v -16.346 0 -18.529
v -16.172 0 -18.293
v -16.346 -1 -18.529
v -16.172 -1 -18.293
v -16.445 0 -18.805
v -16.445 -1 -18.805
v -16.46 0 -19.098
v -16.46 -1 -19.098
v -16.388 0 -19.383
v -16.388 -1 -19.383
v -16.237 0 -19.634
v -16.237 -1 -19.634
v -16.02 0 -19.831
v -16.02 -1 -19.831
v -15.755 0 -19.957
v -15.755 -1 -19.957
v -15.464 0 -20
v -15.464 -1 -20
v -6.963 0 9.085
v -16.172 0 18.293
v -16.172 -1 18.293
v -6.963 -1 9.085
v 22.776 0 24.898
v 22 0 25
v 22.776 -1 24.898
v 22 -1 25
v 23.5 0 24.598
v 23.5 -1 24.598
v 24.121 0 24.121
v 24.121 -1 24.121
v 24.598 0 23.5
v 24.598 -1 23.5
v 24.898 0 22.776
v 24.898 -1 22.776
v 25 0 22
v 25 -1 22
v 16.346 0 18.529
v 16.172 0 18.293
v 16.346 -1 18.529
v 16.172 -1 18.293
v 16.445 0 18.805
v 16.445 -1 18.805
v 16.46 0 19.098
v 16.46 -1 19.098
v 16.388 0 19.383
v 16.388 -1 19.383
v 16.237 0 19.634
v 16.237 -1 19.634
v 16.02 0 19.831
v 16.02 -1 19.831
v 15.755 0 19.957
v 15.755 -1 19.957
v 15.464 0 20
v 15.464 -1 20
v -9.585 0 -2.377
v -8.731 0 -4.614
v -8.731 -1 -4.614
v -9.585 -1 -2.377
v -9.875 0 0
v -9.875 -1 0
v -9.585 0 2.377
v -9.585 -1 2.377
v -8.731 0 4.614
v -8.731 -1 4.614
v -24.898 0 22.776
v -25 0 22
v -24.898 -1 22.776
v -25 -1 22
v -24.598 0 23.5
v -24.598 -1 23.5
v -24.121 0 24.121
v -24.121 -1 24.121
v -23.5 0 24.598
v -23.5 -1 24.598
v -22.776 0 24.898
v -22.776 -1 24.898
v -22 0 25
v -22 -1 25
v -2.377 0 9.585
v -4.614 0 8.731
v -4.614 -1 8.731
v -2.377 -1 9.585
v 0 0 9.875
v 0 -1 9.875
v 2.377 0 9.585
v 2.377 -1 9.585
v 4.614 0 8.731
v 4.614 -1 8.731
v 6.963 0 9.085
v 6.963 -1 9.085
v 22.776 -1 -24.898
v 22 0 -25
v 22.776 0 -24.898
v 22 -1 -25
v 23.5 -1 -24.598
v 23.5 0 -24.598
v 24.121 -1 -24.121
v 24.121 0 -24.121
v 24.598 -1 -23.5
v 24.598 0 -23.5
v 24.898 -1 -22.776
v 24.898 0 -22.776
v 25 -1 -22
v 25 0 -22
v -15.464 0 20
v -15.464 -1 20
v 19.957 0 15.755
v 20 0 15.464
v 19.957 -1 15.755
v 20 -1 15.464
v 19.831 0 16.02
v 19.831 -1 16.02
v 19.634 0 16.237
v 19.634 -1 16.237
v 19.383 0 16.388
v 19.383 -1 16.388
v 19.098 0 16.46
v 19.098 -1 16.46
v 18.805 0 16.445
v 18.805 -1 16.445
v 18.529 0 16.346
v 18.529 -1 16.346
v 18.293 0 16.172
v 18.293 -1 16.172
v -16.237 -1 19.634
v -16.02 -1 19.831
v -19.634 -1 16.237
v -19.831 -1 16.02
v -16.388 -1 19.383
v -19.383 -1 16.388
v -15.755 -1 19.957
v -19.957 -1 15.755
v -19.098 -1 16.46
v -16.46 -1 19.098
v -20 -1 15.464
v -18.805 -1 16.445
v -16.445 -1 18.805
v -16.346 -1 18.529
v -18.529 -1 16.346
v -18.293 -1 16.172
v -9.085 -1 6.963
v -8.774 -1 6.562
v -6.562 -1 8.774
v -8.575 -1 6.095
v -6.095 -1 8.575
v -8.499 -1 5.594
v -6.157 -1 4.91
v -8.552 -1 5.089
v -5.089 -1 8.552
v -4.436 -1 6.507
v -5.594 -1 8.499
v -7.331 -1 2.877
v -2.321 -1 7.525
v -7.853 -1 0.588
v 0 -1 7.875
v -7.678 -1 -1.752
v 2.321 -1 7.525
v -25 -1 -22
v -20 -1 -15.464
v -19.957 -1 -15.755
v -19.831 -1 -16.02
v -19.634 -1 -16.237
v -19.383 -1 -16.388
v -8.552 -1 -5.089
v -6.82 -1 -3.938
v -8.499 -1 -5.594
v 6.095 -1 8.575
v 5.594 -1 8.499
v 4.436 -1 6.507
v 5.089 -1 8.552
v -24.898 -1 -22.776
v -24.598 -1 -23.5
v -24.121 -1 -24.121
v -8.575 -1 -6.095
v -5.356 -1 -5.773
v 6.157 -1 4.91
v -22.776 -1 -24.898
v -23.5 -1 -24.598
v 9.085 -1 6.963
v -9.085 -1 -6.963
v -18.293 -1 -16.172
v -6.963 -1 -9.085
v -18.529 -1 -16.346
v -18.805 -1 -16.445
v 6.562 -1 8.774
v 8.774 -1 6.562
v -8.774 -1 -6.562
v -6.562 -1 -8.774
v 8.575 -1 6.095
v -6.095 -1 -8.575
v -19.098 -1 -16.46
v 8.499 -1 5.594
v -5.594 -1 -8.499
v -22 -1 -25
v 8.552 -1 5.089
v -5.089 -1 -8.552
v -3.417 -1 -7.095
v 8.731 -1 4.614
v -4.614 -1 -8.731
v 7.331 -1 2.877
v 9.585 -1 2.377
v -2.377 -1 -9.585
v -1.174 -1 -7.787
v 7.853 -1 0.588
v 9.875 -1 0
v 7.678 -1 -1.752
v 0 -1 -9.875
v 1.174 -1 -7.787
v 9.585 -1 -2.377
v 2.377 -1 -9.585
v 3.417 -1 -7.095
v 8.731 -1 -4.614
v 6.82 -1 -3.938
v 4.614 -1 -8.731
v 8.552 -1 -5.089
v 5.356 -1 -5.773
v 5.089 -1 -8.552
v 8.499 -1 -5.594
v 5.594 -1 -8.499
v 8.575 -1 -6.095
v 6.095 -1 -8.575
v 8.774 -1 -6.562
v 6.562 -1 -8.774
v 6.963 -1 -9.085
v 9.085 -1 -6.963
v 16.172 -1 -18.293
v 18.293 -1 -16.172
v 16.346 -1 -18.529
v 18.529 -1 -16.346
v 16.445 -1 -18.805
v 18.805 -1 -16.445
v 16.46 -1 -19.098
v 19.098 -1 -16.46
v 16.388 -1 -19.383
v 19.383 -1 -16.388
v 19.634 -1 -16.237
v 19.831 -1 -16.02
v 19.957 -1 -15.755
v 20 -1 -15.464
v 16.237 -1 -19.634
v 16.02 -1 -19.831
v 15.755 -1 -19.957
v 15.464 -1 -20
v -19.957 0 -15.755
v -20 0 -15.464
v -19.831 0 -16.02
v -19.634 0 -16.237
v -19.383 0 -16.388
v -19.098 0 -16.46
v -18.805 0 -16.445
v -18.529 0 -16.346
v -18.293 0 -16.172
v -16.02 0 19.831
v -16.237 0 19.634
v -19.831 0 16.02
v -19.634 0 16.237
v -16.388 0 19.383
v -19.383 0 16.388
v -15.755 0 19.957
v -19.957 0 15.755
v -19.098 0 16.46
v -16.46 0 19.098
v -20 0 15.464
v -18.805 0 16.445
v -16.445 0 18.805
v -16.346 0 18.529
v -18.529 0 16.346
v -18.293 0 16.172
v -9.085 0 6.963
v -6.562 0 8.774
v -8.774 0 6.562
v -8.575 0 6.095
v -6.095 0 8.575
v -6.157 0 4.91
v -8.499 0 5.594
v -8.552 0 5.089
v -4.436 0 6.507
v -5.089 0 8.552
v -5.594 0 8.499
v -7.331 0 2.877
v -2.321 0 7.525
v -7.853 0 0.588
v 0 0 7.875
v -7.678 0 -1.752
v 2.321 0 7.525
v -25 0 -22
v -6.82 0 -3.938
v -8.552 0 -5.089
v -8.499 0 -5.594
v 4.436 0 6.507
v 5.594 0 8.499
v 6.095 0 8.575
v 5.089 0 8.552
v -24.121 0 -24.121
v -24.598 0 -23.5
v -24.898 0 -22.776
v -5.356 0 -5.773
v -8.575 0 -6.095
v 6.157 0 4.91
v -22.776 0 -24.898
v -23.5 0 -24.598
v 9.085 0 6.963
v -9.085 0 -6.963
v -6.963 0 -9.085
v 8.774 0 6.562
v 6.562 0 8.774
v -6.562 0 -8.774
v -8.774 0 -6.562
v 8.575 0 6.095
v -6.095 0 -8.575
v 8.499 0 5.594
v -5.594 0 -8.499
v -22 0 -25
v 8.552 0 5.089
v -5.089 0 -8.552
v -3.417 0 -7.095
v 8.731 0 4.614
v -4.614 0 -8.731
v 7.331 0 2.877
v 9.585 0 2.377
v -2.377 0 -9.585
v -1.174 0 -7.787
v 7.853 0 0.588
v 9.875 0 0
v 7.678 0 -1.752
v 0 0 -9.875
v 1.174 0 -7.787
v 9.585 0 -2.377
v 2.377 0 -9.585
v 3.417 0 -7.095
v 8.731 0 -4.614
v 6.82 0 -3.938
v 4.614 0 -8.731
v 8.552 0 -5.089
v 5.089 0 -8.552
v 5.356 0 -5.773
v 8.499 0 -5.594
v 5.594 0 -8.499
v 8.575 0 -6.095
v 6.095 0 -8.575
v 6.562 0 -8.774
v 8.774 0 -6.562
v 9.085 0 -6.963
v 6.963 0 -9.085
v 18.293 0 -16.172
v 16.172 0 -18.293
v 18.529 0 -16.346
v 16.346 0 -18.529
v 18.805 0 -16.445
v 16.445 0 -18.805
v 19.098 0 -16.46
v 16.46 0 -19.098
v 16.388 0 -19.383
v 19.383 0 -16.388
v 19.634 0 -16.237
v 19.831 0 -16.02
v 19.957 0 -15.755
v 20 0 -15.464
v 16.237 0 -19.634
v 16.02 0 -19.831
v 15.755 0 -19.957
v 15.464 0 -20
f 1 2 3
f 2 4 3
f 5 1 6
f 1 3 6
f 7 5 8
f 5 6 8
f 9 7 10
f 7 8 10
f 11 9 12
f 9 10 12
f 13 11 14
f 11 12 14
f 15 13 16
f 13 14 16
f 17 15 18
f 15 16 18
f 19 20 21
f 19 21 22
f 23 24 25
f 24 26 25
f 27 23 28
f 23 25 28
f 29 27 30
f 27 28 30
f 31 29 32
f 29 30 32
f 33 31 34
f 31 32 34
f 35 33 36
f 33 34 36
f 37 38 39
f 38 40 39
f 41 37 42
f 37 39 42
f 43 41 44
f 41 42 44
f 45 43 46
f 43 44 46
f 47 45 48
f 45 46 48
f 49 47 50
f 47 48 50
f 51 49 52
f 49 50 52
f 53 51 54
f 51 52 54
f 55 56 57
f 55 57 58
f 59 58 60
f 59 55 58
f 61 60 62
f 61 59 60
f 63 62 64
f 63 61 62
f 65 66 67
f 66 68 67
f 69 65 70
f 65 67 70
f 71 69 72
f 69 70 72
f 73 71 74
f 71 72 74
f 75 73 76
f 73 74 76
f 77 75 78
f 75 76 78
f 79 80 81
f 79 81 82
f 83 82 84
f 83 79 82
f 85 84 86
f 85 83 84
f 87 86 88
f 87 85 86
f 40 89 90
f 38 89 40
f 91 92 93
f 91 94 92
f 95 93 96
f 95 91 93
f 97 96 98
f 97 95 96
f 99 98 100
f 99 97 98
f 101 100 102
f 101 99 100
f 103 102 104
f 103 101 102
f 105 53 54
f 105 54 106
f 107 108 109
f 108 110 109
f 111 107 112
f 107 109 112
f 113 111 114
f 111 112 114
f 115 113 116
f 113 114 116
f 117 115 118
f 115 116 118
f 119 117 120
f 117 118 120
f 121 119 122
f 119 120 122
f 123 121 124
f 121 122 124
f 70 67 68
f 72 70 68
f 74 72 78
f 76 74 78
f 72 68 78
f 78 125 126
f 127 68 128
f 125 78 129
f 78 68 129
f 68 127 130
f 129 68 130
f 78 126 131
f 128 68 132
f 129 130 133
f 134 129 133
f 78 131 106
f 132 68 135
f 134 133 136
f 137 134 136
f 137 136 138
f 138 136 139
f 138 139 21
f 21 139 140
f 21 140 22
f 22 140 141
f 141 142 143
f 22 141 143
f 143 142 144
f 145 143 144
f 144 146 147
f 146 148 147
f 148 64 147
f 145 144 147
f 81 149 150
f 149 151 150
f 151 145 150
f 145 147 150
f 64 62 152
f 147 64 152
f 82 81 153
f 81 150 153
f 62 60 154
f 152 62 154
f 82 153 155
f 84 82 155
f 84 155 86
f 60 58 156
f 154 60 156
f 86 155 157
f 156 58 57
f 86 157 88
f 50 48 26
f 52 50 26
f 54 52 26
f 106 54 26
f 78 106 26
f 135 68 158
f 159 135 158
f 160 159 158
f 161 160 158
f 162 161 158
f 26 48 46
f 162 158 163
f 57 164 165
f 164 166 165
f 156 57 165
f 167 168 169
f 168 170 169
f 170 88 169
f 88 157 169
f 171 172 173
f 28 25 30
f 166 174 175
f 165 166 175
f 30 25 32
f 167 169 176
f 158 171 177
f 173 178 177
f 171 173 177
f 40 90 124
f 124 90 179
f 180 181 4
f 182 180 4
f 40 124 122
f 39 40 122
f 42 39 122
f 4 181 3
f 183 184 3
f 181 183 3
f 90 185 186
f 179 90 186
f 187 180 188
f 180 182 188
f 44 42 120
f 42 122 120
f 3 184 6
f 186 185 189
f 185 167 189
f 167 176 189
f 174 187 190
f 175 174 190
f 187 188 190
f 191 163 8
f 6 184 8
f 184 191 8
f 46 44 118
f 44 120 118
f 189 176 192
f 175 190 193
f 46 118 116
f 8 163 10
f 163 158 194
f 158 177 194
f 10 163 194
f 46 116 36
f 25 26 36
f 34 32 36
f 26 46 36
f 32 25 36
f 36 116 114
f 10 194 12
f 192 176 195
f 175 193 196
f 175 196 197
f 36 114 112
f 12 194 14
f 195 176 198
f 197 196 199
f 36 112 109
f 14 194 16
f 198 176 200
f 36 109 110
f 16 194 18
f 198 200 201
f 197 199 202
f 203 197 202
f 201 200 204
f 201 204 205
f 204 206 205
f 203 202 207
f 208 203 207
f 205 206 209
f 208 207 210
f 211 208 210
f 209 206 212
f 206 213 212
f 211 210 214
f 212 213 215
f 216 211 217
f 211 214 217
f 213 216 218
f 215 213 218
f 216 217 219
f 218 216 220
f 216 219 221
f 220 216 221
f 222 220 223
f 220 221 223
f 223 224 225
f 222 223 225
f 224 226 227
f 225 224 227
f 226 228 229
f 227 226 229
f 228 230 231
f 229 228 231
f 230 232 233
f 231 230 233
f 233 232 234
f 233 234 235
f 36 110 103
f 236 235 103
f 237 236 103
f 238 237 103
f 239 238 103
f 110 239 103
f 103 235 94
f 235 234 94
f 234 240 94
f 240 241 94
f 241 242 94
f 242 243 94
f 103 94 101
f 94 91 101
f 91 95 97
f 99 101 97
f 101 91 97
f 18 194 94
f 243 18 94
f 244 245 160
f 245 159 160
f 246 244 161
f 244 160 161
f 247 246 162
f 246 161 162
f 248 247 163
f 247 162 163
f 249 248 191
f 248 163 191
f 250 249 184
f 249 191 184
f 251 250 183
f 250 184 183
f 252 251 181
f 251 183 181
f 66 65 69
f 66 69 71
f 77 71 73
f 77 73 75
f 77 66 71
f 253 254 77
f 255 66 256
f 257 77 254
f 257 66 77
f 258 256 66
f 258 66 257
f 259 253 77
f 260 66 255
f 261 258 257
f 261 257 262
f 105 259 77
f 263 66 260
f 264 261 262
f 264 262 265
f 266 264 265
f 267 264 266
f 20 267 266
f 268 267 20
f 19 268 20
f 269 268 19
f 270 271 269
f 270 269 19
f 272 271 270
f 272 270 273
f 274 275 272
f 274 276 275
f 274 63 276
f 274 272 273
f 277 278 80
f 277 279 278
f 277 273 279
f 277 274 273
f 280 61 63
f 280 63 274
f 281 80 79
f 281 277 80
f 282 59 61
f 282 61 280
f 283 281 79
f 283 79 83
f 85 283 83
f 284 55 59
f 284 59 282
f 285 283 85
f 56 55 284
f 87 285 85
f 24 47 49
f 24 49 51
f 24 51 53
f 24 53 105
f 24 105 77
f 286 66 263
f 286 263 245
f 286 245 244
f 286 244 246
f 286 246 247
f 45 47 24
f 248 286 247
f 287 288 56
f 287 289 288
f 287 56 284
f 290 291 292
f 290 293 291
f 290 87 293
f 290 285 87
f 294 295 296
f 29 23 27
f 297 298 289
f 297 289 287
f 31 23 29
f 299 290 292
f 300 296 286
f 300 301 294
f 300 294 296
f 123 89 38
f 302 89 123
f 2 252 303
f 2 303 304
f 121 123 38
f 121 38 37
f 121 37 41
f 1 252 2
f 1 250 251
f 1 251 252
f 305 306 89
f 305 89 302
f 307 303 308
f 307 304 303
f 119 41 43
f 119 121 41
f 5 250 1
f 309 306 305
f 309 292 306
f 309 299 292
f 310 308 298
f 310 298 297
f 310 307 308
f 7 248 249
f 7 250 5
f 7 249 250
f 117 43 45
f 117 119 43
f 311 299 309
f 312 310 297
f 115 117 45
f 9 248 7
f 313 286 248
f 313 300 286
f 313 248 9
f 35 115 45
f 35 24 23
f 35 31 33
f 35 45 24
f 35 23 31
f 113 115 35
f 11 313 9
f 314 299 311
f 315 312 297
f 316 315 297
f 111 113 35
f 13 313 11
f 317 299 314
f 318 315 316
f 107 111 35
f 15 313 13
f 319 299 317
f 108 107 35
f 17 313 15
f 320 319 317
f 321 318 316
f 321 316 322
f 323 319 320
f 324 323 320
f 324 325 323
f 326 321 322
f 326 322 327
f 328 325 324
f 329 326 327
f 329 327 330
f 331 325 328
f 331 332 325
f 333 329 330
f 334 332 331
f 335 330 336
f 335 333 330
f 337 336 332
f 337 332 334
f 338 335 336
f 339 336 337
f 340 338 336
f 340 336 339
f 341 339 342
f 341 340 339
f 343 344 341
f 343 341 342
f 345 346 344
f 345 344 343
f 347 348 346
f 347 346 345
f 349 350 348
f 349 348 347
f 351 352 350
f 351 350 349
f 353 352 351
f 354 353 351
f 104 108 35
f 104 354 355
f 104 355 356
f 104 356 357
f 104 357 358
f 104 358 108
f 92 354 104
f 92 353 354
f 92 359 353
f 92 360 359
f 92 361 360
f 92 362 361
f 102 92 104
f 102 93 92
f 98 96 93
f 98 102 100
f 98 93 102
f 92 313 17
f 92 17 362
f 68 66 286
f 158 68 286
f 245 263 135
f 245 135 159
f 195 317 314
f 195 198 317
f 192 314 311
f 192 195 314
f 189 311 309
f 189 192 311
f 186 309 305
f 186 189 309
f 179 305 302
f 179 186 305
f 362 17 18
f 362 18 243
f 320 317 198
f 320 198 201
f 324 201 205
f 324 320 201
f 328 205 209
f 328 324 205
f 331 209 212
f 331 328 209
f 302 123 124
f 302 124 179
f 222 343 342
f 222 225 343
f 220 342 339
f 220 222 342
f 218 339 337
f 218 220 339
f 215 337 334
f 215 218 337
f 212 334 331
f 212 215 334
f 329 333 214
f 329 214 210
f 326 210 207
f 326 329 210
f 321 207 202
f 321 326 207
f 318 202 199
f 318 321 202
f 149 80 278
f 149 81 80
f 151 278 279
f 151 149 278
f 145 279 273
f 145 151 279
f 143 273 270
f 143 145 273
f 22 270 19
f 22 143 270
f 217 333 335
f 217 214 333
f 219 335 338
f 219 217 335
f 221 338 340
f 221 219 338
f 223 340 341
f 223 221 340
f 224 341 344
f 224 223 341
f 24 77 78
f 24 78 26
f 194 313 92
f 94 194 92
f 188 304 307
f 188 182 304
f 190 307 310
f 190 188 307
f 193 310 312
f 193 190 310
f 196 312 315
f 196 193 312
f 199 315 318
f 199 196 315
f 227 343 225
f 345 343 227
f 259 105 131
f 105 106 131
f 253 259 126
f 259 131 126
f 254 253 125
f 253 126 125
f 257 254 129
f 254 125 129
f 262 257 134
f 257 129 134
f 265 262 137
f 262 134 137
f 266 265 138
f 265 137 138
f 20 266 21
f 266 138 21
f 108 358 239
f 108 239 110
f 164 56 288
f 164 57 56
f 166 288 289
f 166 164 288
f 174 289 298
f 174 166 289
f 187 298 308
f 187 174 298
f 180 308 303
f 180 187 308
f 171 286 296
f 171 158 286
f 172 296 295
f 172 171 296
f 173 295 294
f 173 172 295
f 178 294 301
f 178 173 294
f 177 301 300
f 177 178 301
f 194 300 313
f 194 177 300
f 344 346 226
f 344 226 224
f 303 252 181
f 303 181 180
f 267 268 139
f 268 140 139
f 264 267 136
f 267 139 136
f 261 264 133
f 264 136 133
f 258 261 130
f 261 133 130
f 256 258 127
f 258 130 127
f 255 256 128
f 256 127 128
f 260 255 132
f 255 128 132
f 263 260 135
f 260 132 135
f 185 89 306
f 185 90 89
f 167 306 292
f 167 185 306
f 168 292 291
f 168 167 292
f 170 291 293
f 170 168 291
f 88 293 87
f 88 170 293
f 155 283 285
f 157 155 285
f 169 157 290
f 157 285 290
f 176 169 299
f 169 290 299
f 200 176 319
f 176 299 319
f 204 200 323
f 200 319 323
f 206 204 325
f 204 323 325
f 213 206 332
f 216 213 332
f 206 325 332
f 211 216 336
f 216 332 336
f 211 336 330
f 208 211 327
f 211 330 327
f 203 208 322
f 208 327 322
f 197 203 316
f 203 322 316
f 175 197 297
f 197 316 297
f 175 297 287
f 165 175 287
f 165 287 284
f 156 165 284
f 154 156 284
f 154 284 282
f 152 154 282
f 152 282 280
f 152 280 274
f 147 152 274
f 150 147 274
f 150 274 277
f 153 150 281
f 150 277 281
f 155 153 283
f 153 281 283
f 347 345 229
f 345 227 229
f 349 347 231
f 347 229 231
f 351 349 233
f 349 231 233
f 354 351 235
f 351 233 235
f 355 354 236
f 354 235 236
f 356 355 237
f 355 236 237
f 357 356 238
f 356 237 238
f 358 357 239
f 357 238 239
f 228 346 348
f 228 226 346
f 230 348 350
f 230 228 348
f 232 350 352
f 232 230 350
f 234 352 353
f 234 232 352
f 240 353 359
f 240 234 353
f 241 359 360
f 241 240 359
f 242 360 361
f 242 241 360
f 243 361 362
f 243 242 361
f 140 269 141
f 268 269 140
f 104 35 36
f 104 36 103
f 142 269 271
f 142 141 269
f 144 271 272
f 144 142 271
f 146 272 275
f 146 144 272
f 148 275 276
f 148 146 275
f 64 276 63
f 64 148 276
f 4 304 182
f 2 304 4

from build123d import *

# Parameters (mm, degrees)
SKETCH1_W          = 50
SKETCH1_H          = 50
SKETCH1_R          = 7.875
BASE_FLANGE1_DEPTH = 1
FILLET1_R          = 3
FILLET2_R          = 1
FILLET3_R          = 2


# Sheet-metal steps are written as plain solids
with BuildPart() as part:
    # Sketch1 → Base-Flange1 (new body)
    with BuildSketch(Plane(origin=(0, 0, 0), x_dir=(1, 0, 0), z_dir=(0, 1, 0))):
        Rectangle(SKETCH1_W, SKETCH1_H)
        with Locations(Location((0, 0, 0), (0, 0, 270))):
            Circle(SKETCH1_R, mode=Mode.SUBTRACT)
        with BuildLine():
            Line((20, 17.878679656), (20, -17.878679656))
            Line((20, -17.878679656), (7.962313054, -5.84099271))
            ThreePointArc((7.962313054, -5.84099271), (9.875, 0), (7.962313054, 5.84099271))
            Line((7.962313054, 5.84099271), (20, 17.878679656))
        make_face(mode=Mode.SUBTRACT)
        with BuildLine():
            Line((17.878679656, -20), (-17.878679656, -20))
            Line((-17.878679656, -20), (-5.84099271, -7.962313054))
            ThreePointArc((-5.84099271, -7.962313054), (0, -9.875), (5.84099271, -7.962313054))
            Line((5.84099271, -7.962313054), (17.878679656, -20))
        make_face(mode=Mode.SUBTRACT)
        with BuildLine():
            Line((-20, -17.878679656), (-20, 17.878679656))
            Line((-20, 17.878679656), (-7.962313054, 5.84099271))
            ThreePointArc((-7.962313054, 5.84099271), (-9.875, 0), (-7.962313054, -5.84099271))
            Line((-7.962313054, -5.84099271), (-20, -17.878679656))
        make_face(mode=Mode.SUBTRACT)
        with BuildLine():
            Line((-17.878679656, 20), (17.878679656, 20))
            Line((17.878679656, 20), (5.84099271, 7.962313054))
            ThreePointArc((5.84099271, 7.962313054), (0, 9.875), (-5.84099271, 7.962313054))
            Line((-5.84099271, 7.962313054), (-17.878679656, 20))
        make_face(mode=Mode.SUBTRACT)
    extrude(amount=-BASE_FLANGE1_DEPTH)

    # Fillet1
    fillet1_edges = [part.edges().sort_by_distance(p)[0] for p in [
        (25, -0.5, 25),
        (-25, -0.5, 25),
        (-25, -0.5, -25),
        (25, -0.5, -25),
    ]]
    fillet(fillet1_edges, radius=FILLET1_R)

    # Fillet2
    fillet2_edges = [part.edges().sort_by_distance(p)[0] for p in [
        (17.878679656, -0.5, 20),
        (-17.878679656, -0.5, 20),
        (20, -0.5, -17.878679656),
        (20, -0.5, 17.878679656),
        (17.878679656, -0.5, -20),
        (-17.878679656, -0.5, -20),
        (-20, -0.5, -17.878679656),
        (-20, -0.5, 17.878679656),
    ]]
    fillet(fillet2_edges, radius=FILLET2_R)

    # Fillet3
    fillet3_edges = [part.edges().sort_by_distance(p)[0] for p in [
        (-5.84099271, -0.5, 7.962313054),
        (5.84099271, -0.5, 7.962313054),
        (7.962313054, -0.5, -5.84099271),
        (7.962313054, -0.5, 5.84099271),
        (5.84099271, -0.5, -7.962313054),
        (-5.84099271, -0.5, -7.962313054),
        (-7.962313054, -0.5, -5.84099271),
        (-7.962313054, -0.5, 5.84099271),
    ]]
    fillet(fillet3_edges, radius=FILLET3_R)


solid = part.part
